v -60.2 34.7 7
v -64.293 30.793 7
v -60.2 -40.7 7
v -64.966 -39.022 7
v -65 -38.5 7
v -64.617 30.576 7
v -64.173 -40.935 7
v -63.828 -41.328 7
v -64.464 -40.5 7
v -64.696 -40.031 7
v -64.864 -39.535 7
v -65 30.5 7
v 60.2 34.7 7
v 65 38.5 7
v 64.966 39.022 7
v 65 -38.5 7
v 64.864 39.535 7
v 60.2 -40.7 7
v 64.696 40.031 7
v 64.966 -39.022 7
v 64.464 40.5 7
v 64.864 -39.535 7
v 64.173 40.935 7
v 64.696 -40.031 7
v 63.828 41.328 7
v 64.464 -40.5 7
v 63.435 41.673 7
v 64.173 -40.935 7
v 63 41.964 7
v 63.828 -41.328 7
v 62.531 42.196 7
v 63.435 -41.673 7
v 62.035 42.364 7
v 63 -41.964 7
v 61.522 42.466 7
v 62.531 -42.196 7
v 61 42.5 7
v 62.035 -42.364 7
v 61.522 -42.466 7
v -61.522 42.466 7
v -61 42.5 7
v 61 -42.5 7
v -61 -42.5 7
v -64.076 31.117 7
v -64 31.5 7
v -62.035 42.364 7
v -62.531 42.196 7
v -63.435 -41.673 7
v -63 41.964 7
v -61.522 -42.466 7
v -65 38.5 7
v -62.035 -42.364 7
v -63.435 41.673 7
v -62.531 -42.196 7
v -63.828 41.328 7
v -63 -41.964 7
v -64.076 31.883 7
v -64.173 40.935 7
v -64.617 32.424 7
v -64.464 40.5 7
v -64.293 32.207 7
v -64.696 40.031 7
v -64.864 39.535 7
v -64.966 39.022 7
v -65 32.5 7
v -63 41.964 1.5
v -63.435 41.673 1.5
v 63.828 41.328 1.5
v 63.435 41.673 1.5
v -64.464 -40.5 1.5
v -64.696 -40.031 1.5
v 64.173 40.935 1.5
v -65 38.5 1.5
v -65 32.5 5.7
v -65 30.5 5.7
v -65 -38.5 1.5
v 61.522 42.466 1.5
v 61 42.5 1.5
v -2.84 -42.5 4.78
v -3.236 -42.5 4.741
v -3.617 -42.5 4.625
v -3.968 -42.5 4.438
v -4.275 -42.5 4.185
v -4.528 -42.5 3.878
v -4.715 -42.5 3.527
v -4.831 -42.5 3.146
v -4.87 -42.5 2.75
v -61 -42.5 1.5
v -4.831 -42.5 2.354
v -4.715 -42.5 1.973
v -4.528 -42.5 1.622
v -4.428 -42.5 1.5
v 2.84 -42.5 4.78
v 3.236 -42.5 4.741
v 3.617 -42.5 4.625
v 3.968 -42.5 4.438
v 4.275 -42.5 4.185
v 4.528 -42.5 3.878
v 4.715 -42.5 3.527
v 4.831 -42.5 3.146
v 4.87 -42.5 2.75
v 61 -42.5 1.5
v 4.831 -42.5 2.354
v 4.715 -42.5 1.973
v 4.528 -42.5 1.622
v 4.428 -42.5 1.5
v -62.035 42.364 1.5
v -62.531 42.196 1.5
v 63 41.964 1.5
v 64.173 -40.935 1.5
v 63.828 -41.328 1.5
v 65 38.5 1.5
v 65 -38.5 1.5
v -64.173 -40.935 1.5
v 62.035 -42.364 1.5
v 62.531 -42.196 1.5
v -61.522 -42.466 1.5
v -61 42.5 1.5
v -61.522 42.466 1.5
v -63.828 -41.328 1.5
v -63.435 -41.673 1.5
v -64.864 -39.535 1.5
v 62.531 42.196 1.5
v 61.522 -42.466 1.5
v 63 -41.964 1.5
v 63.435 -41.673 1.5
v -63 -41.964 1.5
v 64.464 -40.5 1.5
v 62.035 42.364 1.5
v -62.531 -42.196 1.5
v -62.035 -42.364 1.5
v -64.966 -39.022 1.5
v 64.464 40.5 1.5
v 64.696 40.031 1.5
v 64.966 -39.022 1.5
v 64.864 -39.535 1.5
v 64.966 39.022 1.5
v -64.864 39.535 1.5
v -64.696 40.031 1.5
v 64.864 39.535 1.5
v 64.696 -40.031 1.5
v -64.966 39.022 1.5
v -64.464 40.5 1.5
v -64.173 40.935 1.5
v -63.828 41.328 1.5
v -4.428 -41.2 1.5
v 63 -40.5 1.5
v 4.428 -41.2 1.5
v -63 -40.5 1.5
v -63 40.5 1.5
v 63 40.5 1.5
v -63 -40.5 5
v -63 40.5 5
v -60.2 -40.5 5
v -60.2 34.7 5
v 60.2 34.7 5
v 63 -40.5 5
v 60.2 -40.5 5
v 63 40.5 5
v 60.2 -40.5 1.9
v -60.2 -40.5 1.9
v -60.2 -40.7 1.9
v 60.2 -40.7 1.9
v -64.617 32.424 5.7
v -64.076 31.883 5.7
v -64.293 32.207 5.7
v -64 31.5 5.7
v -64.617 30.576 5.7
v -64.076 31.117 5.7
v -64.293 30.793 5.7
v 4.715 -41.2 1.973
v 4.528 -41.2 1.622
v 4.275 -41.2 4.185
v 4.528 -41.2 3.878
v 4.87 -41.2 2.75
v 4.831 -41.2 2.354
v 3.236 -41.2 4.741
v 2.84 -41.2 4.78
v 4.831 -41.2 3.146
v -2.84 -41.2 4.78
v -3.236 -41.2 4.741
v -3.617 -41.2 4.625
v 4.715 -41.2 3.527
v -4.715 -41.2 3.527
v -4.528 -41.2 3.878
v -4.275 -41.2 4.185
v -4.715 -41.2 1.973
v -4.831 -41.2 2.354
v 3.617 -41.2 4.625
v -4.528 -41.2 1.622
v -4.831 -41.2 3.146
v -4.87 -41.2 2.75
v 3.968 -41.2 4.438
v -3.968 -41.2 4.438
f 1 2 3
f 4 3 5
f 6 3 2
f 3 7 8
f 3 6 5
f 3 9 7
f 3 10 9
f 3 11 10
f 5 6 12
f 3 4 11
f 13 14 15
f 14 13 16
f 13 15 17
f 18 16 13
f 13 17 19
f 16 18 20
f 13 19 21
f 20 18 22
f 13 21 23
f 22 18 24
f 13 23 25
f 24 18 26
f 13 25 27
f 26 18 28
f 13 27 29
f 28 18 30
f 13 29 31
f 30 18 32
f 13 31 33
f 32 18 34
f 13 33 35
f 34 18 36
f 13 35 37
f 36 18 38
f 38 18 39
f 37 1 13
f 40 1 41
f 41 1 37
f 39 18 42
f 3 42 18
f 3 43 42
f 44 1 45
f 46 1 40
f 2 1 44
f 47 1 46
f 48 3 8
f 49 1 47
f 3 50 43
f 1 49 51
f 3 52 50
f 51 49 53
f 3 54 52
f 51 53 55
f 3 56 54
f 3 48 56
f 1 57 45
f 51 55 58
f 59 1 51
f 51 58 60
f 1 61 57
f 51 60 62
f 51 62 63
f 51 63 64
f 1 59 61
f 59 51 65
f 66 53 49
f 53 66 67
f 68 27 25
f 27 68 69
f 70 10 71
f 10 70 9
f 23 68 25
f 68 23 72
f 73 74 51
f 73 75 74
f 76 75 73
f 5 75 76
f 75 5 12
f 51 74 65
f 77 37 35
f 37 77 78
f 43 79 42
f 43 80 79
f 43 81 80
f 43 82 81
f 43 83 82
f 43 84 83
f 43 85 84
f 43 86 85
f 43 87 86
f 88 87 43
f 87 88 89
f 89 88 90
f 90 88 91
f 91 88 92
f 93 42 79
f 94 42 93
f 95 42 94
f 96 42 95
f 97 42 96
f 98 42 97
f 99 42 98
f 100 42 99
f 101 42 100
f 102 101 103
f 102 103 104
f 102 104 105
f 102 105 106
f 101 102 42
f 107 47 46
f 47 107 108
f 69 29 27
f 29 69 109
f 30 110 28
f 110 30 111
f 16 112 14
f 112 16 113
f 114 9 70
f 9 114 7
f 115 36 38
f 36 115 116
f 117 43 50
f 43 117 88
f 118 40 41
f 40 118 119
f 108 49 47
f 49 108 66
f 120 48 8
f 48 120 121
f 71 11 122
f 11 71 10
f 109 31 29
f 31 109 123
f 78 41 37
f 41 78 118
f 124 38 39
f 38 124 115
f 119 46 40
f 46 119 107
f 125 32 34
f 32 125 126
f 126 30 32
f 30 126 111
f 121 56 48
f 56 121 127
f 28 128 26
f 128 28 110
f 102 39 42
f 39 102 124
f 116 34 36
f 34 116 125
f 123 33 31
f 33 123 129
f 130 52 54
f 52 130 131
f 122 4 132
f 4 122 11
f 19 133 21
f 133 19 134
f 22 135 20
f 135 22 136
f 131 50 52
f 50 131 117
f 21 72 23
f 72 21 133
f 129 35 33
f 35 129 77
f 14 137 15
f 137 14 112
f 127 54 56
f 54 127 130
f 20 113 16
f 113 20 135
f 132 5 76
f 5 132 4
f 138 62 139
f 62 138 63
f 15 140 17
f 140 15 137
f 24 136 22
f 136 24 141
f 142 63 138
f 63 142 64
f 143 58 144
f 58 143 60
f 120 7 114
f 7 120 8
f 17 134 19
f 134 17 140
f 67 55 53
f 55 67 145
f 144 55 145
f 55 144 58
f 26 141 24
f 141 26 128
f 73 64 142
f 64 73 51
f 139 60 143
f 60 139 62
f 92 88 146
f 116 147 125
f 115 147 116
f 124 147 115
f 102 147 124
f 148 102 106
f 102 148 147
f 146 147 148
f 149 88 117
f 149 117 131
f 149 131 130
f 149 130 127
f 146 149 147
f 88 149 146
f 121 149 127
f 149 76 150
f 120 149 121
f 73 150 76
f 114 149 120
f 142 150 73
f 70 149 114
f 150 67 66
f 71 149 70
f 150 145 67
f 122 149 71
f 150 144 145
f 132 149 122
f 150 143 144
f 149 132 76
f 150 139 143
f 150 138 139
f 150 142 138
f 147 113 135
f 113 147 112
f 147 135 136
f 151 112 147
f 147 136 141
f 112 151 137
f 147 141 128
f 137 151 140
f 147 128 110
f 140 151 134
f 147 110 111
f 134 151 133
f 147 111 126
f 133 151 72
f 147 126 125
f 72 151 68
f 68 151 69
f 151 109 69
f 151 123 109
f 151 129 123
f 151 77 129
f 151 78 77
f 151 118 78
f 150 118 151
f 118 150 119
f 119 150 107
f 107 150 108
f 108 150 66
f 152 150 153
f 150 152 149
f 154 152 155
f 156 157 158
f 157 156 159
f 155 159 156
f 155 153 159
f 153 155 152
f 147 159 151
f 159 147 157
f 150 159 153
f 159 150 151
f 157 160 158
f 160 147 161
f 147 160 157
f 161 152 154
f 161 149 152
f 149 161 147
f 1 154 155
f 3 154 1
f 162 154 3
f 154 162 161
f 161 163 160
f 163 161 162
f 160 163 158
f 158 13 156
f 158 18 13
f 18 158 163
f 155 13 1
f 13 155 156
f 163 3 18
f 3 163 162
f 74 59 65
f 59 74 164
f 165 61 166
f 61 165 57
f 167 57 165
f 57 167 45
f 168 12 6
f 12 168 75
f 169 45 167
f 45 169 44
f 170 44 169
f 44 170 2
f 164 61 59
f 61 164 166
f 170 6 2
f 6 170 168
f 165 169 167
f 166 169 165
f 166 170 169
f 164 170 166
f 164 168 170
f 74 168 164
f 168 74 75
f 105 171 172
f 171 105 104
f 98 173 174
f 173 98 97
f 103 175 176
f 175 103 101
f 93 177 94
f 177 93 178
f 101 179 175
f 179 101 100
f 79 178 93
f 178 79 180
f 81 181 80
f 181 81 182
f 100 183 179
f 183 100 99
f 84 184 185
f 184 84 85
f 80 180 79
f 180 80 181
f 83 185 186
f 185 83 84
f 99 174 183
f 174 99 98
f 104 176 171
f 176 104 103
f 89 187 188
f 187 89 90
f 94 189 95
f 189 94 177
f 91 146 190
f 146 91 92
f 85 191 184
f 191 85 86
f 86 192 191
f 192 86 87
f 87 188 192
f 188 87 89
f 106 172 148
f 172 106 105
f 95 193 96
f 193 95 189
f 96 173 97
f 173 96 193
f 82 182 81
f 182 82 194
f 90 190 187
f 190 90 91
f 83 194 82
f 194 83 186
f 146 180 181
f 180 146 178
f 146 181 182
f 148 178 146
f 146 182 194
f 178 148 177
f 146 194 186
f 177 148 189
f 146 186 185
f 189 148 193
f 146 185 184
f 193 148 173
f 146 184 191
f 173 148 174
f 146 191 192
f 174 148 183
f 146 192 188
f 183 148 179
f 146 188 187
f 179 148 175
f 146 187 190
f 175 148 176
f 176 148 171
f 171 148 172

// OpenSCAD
rotate(a = [0, 180, 0]) {
	difference() {
		difference() {
			difference() {
				difference() {
					difference() {
						difference() {
							union() {
								union() {
									intersection() {
										hull() {
											translate(v = [-61.0, -38.5, 0]) {
												cylinder($fn = 48, center = true, h = 14.0, r = 4.0);
											}
											translate(v = [-61.0, 38.5, 0]) {
												cylinder($fn = 48, center = true, h = 14.0, r = 4.0);
											}
											translate(v = [61.0, -38.5, 0]) {
												cylinder($fn = 48, center = true, h = 14.0, r = 4.0);
											}
											translate(v = [61.0, 38.5, 0]) {
												cylinder($fn = 48, center = true, h = 14.0, r = 4.0);
											}
										}
										translate(v = [0, 0, -4.25]) {
											cube(center = true, size = [132.0, 87.0, 5.5]);
										}
									}
									translate(v = [0, 0, -2.1]) {
										difference() {
											hull() {
												translate(v = [-61.0, -38.5, 0]) {
													cylinder($fn = 48, center = true, h = 1.2, r = 2.8);
												}
												translate(v = [-61.0, 38.5, 0]) {
													cylinder($fn = 48, center = true, h = 1.2, r = 2.8);
												}
												translate(v = [61.0, -38.5, 0]) {
													cylinder($fn = 48, center = true, h = 1.2, r = 2.8);
												}
												translate(v = [61.0, 38.5, 0]) {
													cylinder($fn = 48, center = true, h = 1.2, r = 2.8);
												}
											}
											hull() {
												translate(v = [-61.0, -38.5, 0]) {
													cylinder($fn = 48, center = true, h = 1.4, r = 1.2);
												}
												translate(v = [-61.0, 38.5, 0]) {
													cylinder($fn = 48, center = true, h = 1.4, r = 1.2);
												}
												translate(v = [61.0, -38.5, 0]) {
													cylinder($fn = 48, center = true, h = 1.4, r = 1.2);
												}
												translate(v = [61.0, 38.5, 0]) {
													cylinder($fn = 48, center = true, h = 1.4, r = 1.2);
												}
											}
										}
									}
								}
								union() {
									translate(v = [-60.0, 15.75, -2.0]) {
										rotate(a = [0, 0, 90]) {
											union() {
												cube(center = true, size = [8.0, 1.0, 3.0]);
												translate(v = [0, -0.75, 1.5]) {
													cube(center = true, size = [8.0, 1.5, 1.0]);
												}
											}
										}
									}
									translate(v = [-60.0, -21.75, -2.0]) {
										rotate(a = [0, 0, 90]) {
											union() {
												cube(center = true, size = [8.0, 1.0, 3.0]);
												translate(v = [0, -0.75, 1.5]) {
													cube(center = true, size = [8.0, 1.5, 1.0]);
												}
											}
										}
									}
									translate(v = [60.0, 15.75, -2.0]) {
										rotate(a = [0, 0, -90]) {
											union() {
												cube(center = true, size = [8.0, 1.0, 3.0]);
												translate(v = [0, -0.75, 1.5]) {
													cube(center = true, size = [8.0, 1.5, 1.0]);
												}
											}
										}
									}
									translate(v = [60.0, -21.75, -2.0]) {
										rotate(a = [0, 0, -90]) {
											union() {
												cube(center = true, size = [8.0, 1.0, 3.0]);
												translate(v = [0, -0.75, 1.5]) {
													cube(center = true, size = [8.0, 1.5, 1.0]);
												}
											}
										}
									}
								}
							}
							cube(center = true, size = [126.0, 81.0, 10.0]);
						}
						translate(v = [0, -3.0, -4.5]) {
							cube(center = true, size = [120.4, 75.4, 5.2]);
						}
					}
					translate(v = [0, -3.0, -7.0]) {
						cube(center = true, size = [109.0, 65.8, 2.6]);
					}
				}
				translate(v = [0, -48.5, -7.0]) {
					union() {
						translate(v = [-14.0, 0, 0]) {
							cylinder($fn = 32, center = true, d = 8.0, h = 2.6);
						}
						translate(v = [0.0, 0, 0]) {
							cylinder($fn = 32, center = true, d = 8.0, h = 2.6);
						}
						translate(v = [14.0, 0, 0]) {
							cylinder($fn = 32, center = true, d = 8.0, h = 2.6);
						}
					}
				}
			}
			translate(v = [65.0, 31.5, -7.0]) {
				cylinder($fn = 16, center = true, d = 2.0, h = 2.6);
			}
		}
		translate(v = [0, -42.5, -2.75]) {
			rotate(a = [90, 0, 0]) {
				linear_extrude(center = true, height = 2.6) {
					hull() {
						translate(v = [-2.84, 0]) {
							circle($fn = 32, r = 2.0300000000000002);
						}
						translate(v = [2.84, 0]) {
							circle($fn = 32, r = 2.0300000000000002);
						}
					}
				}
			}
		}
	}
}
